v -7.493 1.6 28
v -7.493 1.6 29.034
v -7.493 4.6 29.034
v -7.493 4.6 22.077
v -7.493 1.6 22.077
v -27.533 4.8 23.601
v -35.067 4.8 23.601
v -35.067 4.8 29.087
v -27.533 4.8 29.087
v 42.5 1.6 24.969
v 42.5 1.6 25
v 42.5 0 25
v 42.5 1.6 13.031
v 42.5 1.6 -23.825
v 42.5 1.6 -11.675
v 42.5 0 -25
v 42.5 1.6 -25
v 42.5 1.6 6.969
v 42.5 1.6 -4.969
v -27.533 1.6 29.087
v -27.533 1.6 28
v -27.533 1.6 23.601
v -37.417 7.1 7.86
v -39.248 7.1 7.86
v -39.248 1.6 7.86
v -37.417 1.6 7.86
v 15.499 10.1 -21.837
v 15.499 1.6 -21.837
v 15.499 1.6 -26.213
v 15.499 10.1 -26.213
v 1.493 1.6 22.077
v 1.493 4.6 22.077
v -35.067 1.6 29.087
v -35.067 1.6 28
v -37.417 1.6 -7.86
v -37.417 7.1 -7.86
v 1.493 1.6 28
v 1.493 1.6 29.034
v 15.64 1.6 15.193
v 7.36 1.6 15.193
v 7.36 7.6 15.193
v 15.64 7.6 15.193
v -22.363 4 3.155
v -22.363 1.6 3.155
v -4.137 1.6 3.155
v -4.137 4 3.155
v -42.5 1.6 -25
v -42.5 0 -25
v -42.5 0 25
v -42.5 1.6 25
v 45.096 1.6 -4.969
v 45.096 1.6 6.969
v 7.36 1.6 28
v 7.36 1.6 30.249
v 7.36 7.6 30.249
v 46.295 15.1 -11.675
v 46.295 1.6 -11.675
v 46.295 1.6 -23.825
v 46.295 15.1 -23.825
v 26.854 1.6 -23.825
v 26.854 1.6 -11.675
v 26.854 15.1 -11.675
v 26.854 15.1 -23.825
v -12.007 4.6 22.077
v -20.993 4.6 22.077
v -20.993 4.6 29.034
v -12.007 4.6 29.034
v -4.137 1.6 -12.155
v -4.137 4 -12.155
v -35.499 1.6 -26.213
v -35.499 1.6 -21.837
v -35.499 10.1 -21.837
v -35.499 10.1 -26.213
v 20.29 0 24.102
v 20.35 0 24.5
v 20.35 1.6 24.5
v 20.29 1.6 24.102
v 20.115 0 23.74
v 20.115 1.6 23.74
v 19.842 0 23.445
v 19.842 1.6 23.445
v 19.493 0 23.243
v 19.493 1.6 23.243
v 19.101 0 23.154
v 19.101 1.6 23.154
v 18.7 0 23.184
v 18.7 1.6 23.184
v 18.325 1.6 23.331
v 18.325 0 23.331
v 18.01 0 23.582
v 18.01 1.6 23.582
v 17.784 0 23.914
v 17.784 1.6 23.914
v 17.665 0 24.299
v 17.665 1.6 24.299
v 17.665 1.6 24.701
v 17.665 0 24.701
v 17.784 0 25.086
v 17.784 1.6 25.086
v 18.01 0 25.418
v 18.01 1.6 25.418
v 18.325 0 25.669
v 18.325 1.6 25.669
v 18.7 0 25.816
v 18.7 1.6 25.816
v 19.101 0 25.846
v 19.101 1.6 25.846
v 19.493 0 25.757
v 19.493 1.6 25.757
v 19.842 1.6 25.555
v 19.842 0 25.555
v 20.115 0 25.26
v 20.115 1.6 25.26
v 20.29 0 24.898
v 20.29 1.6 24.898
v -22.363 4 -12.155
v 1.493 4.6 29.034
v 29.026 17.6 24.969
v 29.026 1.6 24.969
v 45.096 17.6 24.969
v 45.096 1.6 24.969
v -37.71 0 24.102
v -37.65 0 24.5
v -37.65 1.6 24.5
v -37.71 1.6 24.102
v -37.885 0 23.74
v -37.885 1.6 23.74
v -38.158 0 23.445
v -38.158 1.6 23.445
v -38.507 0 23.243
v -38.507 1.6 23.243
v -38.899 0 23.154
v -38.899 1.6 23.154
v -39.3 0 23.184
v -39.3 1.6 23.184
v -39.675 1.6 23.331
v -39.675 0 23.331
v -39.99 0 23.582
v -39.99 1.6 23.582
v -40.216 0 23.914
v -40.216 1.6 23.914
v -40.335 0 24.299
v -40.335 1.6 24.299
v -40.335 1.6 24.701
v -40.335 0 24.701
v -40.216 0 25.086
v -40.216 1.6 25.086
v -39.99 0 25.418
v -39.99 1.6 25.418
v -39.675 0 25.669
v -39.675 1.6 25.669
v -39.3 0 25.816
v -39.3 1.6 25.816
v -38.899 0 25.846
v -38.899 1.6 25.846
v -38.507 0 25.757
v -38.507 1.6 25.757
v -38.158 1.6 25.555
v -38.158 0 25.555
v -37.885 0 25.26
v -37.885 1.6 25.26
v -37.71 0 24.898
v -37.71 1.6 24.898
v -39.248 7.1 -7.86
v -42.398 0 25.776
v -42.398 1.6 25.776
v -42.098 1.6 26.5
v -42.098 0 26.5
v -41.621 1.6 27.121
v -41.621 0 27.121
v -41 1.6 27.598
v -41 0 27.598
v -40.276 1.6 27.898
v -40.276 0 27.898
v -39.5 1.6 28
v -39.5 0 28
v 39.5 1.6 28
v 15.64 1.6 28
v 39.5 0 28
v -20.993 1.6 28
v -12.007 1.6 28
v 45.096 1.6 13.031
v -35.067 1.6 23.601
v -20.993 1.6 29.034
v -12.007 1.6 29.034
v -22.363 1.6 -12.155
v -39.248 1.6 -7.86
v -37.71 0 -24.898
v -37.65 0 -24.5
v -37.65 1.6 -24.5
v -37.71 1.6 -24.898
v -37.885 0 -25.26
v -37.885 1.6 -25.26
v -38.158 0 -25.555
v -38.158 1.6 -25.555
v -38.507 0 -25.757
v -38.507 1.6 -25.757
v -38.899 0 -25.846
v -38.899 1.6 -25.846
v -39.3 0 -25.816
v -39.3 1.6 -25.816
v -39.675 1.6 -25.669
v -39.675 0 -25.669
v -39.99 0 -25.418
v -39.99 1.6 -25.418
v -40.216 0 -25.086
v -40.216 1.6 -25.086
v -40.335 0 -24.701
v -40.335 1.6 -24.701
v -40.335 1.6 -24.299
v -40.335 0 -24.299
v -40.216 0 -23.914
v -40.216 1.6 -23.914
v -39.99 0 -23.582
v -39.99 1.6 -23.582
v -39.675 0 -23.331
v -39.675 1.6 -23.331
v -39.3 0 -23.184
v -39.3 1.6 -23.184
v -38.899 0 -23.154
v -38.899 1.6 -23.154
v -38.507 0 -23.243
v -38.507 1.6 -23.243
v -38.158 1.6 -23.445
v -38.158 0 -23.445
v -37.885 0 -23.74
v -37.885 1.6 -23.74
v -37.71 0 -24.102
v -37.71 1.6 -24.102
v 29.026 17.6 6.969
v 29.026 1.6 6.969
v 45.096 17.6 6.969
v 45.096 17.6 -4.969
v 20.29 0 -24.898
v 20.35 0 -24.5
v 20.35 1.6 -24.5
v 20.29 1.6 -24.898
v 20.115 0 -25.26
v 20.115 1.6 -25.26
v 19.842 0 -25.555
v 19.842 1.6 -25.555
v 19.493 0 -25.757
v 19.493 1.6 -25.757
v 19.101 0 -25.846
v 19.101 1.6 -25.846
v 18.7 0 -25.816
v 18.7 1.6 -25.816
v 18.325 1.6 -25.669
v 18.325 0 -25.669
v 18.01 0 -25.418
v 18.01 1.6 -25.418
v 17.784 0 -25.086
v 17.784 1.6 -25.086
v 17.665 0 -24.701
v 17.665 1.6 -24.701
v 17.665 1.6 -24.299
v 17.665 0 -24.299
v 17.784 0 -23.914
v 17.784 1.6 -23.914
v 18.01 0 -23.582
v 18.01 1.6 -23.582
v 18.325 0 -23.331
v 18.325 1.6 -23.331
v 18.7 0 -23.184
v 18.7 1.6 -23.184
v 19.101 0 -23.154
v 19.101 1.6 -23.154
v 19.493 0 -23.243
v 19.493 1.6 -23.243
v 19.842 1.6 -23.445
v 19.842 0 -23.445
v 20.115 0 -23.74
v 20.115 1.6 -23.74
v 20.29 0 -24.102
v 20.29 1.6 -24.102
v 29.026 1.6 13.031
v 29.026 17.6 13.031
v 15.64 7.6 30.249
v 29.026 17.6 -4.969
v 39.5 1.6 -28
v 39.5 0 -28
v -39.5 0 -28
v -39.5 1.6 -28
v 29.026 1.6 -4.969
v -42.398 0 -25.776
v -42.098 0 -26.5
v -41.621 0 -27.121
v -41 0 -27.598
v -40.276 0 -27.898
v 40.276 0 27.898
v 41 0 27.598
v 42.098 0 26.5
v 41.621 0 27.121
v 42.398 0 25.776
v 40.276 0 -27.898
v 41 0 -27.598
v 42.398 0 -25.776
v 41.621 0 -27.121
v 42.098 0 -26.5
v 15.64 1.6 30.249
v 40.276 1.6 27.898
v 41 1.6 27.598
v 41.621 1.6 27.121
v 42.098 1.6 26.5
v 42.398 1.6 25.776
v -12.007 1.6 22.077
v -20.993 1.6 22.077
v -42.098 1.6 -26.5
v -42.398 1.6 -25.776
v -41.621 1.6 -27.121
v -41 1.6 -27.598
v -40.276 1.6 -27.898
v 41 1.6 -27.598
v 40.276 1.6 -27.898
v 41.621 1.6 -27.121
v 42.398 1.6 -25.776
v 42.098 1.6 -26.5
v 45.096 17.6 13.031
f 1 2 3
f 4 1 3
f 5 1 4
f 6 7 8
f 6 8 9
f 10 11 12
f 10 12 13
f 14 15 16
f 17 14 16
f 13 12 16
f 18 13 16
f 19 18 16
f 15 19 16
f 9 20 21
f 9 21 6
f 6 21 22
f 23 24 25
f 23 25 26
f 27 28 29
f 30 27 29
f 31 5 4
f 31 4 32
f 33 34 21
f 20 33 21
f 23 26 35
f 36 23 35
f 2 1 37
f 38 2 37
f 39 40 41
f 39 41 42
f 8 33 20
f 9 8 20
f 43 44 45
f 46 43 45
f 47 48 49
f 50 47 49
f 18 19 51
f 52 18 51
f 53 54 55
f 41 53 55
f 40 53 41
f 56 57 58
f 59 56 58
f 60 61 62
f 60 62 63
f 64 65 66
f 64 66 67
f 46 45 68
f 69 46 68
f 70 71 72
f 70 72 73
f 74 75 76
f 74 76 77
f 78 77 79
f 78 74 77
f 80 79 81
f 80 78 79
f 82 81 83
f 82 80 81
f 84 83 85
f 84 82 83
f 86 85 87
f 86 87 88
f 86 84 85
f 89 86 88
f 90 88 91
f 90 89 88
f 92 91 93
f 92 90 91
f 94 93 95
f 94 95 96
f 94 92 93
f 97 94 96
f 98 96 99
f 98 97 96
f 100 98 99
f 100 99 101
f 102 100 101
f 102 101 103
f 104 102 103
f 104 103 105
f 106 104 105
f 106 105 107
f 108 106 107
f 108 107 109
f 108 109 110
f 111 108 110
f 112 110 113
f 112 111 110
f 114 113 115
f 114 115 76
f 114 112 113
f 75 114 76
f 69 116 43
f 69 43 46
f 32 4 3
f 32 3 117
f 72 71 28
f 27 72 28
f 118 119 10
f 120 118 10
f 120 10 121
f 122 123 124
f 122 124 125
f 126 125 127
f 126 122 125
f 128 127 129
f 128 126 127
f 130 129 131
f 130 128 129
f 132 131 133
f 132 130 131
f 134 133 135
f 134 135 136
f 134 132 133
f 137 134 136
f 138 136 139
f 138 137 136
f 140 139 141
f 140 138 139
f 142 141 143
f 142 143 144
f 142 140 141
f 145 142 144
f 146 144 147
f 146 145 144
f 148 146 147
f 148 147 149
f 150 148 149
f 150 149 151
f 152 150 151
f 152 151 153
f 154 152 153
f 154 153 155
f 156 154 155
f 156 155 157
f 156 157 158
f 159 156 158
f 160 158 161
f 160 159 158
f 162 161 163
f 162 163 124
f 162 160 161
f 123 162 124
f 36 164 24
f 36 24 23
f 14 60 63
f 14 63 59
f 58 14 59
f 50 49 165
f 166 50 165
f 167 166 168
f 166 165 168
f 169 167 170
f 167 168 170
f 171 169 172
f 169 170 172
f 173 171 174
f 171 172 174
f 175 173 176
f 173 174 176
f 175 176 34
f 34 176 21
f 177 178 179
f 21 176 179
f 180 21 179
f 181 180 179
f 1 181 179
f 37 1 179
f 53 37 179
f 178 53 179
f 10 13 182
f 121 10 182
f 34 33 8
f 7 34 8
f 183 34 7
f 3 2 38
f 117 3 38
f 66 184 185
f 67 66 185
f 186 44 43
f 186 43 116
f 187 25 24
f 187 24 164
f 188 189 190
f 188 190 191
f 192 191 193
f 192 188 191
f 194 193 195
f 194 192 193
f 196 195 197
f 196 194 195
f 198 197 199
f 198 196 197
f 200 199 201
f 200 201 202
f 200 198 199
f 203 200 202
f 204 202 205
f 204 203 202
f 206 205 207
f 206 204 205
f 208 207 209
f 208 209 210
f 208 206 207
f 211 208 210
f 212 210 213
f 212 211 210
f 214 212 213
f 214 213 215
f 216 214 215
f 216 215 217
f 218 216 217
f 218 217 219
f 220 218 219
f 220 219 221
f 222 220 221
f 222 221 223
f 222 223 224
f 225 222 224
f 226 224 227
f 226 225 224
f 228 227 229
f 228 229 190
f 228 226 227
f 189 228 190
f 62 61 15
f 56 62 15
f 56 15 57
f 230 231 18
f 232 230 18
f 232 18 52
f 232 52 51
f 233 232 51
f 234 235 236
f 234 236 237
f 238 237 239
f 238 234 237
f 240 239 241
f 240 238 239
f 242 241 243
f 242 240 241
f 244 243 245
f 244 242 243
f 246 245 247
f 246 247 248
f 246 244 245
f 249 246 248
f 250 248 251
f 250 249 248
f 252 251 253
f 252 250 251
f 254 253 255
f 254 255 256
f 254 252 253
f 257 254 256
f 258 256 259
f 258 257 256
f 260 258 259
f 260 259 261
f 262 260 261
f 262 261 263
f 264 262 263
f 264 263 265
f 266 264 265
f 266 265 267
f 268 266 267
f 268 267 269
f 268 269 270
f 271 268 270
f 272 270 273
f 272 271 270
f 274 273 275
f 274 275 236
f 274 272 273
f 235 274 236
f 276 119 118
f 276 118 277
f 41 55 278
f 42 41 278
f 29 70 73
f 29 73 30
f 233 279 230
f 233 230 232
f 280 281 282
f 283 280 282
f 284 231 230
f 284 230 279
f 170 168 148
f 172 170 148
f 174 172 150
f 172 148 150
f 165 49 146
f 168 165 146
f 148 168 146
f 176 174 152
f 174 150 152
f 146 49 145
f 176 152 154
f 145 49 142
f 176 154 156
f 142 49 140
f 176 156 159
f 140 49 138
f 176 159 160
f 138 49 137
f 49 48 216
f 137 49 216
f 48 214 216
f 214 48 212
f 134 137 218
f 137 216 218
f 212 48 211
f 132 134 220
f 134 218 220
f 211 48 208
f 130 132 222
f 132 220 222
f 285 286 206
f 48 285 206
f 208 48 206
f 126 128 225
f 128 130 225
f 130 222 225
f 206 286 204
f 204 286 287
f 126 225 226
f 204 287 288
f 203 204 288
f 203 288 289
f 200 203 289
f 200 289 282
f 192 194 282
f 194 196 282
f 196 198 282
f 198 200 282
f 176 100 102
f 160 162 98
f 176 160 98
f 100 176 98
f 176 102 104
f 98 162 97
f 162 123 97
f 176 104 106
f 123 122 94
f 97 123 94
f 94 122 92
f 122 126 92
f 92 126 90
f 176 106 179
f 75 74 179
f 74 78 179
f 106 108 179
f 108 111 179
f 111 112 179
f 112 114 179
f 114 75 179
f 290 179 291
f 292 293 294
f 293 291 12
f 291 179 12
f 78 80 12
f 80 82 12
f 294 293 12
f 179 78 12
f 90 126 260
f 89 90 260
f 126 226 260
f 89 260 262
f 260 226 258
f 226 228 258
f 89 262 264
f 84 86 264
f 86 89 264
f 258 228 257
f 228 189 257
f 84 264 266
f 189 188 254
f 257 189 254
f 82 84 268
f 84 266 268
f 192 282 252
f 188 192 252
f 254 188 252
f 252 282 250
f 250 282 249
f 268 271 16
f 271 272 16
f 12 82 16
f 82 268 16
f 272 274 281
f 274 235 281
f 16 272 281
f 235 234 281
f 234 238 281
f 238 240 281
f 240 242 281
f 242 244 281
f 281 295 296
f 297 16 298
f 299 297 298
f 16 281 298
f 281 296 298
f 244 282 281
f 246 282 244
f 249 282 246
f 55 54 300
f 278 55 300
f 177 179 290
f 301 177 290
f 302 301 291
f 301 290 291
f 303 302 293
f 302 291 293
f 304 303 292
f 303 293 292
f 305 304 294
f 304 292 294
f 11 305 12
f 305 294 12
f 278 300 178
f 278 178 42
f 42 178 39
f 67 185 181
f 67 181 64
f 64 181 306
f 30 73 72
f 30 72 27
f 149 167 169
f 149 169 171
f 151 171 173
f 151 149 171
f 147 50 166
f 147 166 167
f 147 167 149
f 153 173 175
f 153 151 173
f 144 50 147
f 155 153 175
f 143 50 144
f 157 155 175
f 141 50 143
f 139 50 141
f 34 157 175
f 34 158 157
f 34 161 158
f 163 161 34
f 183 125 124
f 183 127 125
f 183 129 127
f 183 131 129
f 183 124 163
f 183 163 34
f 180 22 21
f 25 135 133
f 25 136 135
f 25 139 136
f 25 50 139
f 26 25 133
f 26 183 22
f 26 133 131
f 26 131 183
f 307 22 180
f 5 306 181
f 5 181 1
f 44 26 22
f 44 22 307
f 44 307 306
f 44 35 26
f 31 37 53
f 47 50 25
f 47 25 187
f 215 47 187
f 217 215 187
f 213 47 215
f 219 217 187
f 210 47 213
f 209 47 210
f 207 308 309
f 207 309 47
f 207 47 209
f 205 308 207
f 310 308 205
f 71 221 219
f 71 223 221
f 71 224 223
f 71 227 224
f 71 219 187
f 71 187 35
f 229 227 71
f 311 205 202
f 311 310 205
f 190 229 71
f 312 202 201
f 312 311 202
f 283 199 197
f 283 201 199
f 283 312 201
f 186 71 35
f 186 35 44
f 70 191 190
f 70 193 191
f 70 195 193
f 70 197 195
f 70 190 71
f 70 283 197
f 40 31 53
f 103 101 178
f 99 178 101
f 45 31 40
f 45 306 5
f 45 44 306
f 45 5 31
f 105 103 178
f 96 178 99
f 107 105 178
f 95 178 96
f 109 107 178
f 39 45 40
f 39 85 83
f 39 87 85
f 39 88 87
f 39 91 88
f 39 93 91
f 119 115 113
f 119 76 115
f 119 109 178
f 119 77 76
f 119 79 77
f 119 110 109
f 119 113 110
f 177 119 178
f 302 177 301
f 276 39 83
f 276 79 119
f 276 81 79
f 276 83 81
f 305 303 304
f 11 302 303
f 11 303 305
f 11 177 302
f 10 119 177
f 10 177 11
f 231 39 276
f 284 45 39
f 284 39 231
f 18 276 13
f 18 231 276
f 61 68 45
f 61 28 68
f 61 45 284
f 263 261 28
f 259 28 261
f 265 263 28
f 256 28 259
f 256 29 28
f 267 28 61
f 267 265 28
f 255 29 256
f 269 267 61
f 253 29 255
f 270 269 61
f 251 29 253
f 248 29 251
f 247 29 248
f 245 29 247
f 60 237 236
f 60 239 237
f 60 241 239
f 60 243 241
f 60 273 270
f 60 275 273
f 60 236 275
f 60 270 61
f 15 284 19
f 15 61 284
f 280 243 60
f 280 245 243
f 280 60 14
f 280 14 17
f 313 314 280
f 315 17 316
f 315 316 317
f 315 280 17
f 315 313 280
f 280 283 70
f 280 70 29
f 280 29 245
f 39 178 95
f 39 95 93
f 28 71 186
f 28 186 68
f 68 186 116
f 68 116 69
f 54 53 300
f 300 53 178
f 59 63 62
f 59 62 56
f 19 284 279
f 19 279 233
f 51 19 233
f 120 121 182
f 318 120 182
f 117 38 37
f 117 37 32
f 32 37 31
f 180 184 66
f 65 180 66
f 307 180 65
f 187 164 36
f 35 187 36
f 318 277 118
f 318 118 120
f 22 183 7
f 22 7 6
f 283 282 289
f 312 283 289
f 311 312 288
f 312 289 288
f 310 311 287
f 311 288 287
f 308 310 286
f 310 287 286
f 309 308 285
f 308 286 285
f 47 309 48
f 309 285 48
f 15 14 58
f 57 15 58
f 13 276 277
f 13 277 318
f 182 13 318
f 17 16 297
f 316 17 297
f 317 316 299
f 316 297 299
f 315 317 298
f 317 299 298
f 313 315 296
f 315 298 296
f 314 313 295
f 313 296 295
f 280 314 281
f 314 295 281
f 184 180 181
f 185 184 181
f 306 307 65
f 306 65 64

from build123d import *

# Parameters (mm, degrees)
SKETCH1_R           = 1.35
BOSS_EXTRUDE1_DEPTH = 1.6
SKETCH2_W           = 7.53328877
SKETCH2_H           = 5.48663035
BOSS_EXTRUDE2_DEPTH = 3.2
SKETCH3_W           = 8.985946342
SKETCH3_H           = 6.956967826
BOSS_EXTRUDE3_DEPTH = 3
SKETCH4_W           = 8.28060663
SKETCH4_H           = 15.055648418
BOSS_EXTRUDE4_DEPTH = 6
SKETCH5_W           = 16.070010529
SKETCH5_H           = 11.93886501
BOSS_EXTRUDE5_DEPTH = 16
SKETCH6_W           = 19.440745211
SKETCH6_H           = 12.150465756
BOSS_EXTRUDE6_DEPTH = 13.5
SKETCH7_W           = 18.225698636
SKETCH7_H           = 15.309586854
BOSS_EXTRUDE7_DEPTH = 2.4
SKETCH8_W           = 50.998692198
SKETCH8_H           = 4.375780892
BOSS_EXTRUDE8_DEPTH = 8.5
SKETCH9_W           = 1.831399212
SKETCH9_H           = 15.719207136
BOSS_EXTRUDE9_DEPTH = 5.5


with BuildPart() as part:
    # Sketch1 → Boss-Extrude1 (new body)
    with BuildSketch(Plane(origin=(0, 0, 0), x_dir=(1, 0, 0), z_dir=(0, 1, 0))):
        with BuildLine():
            Line((-39.5, -28), (39.5, -28))
            ThreePointArc((39.5, -28), (41.621320344, -27.121320344), (42.5, -25))
            Line((42.5, -25), (42.5, 25))
            ThreePointArc((42.5, 25), (41.621320344, 27.121320344), (39.5, 28))
            Line((39.5, 28), (-39.5, 28))
            ThreePointArc((-39.5, 28), (-41.621320344, 27.121320344), (-42.5, 25))
            Line((-42.5, 25), (-42.5, -25))
            ThreePointArc((-42.5, -25), (-41.621320344, -27.121320344), (-39.5, -28))
        make_face()
        with Locations((-39, 24.5)):
            Circle(SKETCH1_R, mode=Mode.SUBTRACT)
        with Locations((19, 24.5)):
            Circle(SKETCH1_R, mode=Mode.SUBTRACT)
        with Locations((19, -24.5)):
            Circle(SKETCH1_R, mode=Mode.SUBTRACT)
        with Locations((-39, -24.5)):
            Circle(SKETCH1_R, mode=Mode.SUBTRACT)
    extrude(amount=BOSS_EXTRUDE1_DEPTH)

    # Sketch2 → Boss-Extrude2 (add)
    with BuildSketch(Plane(origin=(0, 1.6, 0), x_dir=(1, 0, 0), z_dir=(0, 1, 0))):
        with Locations((-31.3, -26.343842904)):
            Rectangle(SKETCH2_W, SKETCH2_H)
    extrude(amount=BOSS_EXTRUDE2_DEPTH)

    # Sketch3 → Boss-Extrude3 (add)
    with BuildSketch(Plane(origin=(0, 1.6, 0), x_dir=(1, 0, 0), z_dir=(0, 1, 0))):
        with Locations((-16.5, -25.555818694)):
            Rectangle(SKETCH3_W, SKETCH3_H)
        with Locations((-3, -25.555818694)):
            Rectangle(SKETCH3_W, SKETCH3_H)
    extrude(amount=BOSS_EXTRUDE3_DEPTH)

    # Sketch4 → Boss-Extrude4 (add)
    with BuildSketch(Plane(origin=(0, 1.6, 0), x_dir=(1, 0, 0), z_dir=(0, 1, 0))):
        with Locations((11.5, -22.720760552)):
            Rectangle(SKETCH4_W, SKETCH4_H)
    extrude(amount=BOSS_EXTRUDE4_DEPTH)

    # Sketch5 → Boss-Extrude5 (add)
    with BuildSketch(Plane(origin=(0, 1.6, 0), x_dir=(1, 0, 0), z_dir=(0, 1, 0))):
        with Locations((37.060775688, -19)):
            Rectangle(SKETCH5_W, SKETCH5_H)
        with Locations((37.060775688, -1)):
            Rectangle(SKETCH5_W, SKETCH5_H)
    extrude(amount=BOSS_EXTRUDE5_DEPTH)

    # Sketch6 → Boss-Extrude6 (add)
    with BuildSketch(Plane(origin=(0, 1.6, 0), x_dir=(1, 0, 0), z_dir=(0, 1, 0))):
        with Locations((36.574757039, 17.75)):
            Rectangle(SKETCH6_W, SKETCH6_H)
    extrude(amount=BOSS_EXTRUDE6_DEPTH)

    # Sketch7 → Boss-Extrude7 (add)
    with BuildSketch(Plane(origin=(0, 1.6, 0), x_dir=(1, 0, 0), z_dir=(0, 1, 0))):
        with Locations((-13.25, 4.5)):
            Rectangle(SKETCH7_W, SKETCH7_H)
    extrude(amount=BOSS_EXTRUDE7_DEPTH)

    # Sketch8 → Boss-Extrude8 (add)
    with BuildSketch(Plane(origin=(0, 1.6, 0), x_dir=(1, 0, 0), z_dir=(0, 1, 0))):
        with Locations((-10, 24.024952291)):
            Rectangle(SKETCH8_W, SKETCH8_H)
    extrude(amount=BOSS_EXTRUDE8_DEPTH)

    # Sketch9 → Boss-Extrude9 (add)
    with BuildSketch(Plane(origin=(0, 1.6, 0), x_dir=(1, 0, 0), z_dir=(0, 1, 0))):
        with Locations((-38.332266869, 0)):
            Rectangle(SKETCH9_W, SKETCH9_H)
    extrude(amount=BOSS_EXTRUDE9_DEPTH)


solid = part.part
